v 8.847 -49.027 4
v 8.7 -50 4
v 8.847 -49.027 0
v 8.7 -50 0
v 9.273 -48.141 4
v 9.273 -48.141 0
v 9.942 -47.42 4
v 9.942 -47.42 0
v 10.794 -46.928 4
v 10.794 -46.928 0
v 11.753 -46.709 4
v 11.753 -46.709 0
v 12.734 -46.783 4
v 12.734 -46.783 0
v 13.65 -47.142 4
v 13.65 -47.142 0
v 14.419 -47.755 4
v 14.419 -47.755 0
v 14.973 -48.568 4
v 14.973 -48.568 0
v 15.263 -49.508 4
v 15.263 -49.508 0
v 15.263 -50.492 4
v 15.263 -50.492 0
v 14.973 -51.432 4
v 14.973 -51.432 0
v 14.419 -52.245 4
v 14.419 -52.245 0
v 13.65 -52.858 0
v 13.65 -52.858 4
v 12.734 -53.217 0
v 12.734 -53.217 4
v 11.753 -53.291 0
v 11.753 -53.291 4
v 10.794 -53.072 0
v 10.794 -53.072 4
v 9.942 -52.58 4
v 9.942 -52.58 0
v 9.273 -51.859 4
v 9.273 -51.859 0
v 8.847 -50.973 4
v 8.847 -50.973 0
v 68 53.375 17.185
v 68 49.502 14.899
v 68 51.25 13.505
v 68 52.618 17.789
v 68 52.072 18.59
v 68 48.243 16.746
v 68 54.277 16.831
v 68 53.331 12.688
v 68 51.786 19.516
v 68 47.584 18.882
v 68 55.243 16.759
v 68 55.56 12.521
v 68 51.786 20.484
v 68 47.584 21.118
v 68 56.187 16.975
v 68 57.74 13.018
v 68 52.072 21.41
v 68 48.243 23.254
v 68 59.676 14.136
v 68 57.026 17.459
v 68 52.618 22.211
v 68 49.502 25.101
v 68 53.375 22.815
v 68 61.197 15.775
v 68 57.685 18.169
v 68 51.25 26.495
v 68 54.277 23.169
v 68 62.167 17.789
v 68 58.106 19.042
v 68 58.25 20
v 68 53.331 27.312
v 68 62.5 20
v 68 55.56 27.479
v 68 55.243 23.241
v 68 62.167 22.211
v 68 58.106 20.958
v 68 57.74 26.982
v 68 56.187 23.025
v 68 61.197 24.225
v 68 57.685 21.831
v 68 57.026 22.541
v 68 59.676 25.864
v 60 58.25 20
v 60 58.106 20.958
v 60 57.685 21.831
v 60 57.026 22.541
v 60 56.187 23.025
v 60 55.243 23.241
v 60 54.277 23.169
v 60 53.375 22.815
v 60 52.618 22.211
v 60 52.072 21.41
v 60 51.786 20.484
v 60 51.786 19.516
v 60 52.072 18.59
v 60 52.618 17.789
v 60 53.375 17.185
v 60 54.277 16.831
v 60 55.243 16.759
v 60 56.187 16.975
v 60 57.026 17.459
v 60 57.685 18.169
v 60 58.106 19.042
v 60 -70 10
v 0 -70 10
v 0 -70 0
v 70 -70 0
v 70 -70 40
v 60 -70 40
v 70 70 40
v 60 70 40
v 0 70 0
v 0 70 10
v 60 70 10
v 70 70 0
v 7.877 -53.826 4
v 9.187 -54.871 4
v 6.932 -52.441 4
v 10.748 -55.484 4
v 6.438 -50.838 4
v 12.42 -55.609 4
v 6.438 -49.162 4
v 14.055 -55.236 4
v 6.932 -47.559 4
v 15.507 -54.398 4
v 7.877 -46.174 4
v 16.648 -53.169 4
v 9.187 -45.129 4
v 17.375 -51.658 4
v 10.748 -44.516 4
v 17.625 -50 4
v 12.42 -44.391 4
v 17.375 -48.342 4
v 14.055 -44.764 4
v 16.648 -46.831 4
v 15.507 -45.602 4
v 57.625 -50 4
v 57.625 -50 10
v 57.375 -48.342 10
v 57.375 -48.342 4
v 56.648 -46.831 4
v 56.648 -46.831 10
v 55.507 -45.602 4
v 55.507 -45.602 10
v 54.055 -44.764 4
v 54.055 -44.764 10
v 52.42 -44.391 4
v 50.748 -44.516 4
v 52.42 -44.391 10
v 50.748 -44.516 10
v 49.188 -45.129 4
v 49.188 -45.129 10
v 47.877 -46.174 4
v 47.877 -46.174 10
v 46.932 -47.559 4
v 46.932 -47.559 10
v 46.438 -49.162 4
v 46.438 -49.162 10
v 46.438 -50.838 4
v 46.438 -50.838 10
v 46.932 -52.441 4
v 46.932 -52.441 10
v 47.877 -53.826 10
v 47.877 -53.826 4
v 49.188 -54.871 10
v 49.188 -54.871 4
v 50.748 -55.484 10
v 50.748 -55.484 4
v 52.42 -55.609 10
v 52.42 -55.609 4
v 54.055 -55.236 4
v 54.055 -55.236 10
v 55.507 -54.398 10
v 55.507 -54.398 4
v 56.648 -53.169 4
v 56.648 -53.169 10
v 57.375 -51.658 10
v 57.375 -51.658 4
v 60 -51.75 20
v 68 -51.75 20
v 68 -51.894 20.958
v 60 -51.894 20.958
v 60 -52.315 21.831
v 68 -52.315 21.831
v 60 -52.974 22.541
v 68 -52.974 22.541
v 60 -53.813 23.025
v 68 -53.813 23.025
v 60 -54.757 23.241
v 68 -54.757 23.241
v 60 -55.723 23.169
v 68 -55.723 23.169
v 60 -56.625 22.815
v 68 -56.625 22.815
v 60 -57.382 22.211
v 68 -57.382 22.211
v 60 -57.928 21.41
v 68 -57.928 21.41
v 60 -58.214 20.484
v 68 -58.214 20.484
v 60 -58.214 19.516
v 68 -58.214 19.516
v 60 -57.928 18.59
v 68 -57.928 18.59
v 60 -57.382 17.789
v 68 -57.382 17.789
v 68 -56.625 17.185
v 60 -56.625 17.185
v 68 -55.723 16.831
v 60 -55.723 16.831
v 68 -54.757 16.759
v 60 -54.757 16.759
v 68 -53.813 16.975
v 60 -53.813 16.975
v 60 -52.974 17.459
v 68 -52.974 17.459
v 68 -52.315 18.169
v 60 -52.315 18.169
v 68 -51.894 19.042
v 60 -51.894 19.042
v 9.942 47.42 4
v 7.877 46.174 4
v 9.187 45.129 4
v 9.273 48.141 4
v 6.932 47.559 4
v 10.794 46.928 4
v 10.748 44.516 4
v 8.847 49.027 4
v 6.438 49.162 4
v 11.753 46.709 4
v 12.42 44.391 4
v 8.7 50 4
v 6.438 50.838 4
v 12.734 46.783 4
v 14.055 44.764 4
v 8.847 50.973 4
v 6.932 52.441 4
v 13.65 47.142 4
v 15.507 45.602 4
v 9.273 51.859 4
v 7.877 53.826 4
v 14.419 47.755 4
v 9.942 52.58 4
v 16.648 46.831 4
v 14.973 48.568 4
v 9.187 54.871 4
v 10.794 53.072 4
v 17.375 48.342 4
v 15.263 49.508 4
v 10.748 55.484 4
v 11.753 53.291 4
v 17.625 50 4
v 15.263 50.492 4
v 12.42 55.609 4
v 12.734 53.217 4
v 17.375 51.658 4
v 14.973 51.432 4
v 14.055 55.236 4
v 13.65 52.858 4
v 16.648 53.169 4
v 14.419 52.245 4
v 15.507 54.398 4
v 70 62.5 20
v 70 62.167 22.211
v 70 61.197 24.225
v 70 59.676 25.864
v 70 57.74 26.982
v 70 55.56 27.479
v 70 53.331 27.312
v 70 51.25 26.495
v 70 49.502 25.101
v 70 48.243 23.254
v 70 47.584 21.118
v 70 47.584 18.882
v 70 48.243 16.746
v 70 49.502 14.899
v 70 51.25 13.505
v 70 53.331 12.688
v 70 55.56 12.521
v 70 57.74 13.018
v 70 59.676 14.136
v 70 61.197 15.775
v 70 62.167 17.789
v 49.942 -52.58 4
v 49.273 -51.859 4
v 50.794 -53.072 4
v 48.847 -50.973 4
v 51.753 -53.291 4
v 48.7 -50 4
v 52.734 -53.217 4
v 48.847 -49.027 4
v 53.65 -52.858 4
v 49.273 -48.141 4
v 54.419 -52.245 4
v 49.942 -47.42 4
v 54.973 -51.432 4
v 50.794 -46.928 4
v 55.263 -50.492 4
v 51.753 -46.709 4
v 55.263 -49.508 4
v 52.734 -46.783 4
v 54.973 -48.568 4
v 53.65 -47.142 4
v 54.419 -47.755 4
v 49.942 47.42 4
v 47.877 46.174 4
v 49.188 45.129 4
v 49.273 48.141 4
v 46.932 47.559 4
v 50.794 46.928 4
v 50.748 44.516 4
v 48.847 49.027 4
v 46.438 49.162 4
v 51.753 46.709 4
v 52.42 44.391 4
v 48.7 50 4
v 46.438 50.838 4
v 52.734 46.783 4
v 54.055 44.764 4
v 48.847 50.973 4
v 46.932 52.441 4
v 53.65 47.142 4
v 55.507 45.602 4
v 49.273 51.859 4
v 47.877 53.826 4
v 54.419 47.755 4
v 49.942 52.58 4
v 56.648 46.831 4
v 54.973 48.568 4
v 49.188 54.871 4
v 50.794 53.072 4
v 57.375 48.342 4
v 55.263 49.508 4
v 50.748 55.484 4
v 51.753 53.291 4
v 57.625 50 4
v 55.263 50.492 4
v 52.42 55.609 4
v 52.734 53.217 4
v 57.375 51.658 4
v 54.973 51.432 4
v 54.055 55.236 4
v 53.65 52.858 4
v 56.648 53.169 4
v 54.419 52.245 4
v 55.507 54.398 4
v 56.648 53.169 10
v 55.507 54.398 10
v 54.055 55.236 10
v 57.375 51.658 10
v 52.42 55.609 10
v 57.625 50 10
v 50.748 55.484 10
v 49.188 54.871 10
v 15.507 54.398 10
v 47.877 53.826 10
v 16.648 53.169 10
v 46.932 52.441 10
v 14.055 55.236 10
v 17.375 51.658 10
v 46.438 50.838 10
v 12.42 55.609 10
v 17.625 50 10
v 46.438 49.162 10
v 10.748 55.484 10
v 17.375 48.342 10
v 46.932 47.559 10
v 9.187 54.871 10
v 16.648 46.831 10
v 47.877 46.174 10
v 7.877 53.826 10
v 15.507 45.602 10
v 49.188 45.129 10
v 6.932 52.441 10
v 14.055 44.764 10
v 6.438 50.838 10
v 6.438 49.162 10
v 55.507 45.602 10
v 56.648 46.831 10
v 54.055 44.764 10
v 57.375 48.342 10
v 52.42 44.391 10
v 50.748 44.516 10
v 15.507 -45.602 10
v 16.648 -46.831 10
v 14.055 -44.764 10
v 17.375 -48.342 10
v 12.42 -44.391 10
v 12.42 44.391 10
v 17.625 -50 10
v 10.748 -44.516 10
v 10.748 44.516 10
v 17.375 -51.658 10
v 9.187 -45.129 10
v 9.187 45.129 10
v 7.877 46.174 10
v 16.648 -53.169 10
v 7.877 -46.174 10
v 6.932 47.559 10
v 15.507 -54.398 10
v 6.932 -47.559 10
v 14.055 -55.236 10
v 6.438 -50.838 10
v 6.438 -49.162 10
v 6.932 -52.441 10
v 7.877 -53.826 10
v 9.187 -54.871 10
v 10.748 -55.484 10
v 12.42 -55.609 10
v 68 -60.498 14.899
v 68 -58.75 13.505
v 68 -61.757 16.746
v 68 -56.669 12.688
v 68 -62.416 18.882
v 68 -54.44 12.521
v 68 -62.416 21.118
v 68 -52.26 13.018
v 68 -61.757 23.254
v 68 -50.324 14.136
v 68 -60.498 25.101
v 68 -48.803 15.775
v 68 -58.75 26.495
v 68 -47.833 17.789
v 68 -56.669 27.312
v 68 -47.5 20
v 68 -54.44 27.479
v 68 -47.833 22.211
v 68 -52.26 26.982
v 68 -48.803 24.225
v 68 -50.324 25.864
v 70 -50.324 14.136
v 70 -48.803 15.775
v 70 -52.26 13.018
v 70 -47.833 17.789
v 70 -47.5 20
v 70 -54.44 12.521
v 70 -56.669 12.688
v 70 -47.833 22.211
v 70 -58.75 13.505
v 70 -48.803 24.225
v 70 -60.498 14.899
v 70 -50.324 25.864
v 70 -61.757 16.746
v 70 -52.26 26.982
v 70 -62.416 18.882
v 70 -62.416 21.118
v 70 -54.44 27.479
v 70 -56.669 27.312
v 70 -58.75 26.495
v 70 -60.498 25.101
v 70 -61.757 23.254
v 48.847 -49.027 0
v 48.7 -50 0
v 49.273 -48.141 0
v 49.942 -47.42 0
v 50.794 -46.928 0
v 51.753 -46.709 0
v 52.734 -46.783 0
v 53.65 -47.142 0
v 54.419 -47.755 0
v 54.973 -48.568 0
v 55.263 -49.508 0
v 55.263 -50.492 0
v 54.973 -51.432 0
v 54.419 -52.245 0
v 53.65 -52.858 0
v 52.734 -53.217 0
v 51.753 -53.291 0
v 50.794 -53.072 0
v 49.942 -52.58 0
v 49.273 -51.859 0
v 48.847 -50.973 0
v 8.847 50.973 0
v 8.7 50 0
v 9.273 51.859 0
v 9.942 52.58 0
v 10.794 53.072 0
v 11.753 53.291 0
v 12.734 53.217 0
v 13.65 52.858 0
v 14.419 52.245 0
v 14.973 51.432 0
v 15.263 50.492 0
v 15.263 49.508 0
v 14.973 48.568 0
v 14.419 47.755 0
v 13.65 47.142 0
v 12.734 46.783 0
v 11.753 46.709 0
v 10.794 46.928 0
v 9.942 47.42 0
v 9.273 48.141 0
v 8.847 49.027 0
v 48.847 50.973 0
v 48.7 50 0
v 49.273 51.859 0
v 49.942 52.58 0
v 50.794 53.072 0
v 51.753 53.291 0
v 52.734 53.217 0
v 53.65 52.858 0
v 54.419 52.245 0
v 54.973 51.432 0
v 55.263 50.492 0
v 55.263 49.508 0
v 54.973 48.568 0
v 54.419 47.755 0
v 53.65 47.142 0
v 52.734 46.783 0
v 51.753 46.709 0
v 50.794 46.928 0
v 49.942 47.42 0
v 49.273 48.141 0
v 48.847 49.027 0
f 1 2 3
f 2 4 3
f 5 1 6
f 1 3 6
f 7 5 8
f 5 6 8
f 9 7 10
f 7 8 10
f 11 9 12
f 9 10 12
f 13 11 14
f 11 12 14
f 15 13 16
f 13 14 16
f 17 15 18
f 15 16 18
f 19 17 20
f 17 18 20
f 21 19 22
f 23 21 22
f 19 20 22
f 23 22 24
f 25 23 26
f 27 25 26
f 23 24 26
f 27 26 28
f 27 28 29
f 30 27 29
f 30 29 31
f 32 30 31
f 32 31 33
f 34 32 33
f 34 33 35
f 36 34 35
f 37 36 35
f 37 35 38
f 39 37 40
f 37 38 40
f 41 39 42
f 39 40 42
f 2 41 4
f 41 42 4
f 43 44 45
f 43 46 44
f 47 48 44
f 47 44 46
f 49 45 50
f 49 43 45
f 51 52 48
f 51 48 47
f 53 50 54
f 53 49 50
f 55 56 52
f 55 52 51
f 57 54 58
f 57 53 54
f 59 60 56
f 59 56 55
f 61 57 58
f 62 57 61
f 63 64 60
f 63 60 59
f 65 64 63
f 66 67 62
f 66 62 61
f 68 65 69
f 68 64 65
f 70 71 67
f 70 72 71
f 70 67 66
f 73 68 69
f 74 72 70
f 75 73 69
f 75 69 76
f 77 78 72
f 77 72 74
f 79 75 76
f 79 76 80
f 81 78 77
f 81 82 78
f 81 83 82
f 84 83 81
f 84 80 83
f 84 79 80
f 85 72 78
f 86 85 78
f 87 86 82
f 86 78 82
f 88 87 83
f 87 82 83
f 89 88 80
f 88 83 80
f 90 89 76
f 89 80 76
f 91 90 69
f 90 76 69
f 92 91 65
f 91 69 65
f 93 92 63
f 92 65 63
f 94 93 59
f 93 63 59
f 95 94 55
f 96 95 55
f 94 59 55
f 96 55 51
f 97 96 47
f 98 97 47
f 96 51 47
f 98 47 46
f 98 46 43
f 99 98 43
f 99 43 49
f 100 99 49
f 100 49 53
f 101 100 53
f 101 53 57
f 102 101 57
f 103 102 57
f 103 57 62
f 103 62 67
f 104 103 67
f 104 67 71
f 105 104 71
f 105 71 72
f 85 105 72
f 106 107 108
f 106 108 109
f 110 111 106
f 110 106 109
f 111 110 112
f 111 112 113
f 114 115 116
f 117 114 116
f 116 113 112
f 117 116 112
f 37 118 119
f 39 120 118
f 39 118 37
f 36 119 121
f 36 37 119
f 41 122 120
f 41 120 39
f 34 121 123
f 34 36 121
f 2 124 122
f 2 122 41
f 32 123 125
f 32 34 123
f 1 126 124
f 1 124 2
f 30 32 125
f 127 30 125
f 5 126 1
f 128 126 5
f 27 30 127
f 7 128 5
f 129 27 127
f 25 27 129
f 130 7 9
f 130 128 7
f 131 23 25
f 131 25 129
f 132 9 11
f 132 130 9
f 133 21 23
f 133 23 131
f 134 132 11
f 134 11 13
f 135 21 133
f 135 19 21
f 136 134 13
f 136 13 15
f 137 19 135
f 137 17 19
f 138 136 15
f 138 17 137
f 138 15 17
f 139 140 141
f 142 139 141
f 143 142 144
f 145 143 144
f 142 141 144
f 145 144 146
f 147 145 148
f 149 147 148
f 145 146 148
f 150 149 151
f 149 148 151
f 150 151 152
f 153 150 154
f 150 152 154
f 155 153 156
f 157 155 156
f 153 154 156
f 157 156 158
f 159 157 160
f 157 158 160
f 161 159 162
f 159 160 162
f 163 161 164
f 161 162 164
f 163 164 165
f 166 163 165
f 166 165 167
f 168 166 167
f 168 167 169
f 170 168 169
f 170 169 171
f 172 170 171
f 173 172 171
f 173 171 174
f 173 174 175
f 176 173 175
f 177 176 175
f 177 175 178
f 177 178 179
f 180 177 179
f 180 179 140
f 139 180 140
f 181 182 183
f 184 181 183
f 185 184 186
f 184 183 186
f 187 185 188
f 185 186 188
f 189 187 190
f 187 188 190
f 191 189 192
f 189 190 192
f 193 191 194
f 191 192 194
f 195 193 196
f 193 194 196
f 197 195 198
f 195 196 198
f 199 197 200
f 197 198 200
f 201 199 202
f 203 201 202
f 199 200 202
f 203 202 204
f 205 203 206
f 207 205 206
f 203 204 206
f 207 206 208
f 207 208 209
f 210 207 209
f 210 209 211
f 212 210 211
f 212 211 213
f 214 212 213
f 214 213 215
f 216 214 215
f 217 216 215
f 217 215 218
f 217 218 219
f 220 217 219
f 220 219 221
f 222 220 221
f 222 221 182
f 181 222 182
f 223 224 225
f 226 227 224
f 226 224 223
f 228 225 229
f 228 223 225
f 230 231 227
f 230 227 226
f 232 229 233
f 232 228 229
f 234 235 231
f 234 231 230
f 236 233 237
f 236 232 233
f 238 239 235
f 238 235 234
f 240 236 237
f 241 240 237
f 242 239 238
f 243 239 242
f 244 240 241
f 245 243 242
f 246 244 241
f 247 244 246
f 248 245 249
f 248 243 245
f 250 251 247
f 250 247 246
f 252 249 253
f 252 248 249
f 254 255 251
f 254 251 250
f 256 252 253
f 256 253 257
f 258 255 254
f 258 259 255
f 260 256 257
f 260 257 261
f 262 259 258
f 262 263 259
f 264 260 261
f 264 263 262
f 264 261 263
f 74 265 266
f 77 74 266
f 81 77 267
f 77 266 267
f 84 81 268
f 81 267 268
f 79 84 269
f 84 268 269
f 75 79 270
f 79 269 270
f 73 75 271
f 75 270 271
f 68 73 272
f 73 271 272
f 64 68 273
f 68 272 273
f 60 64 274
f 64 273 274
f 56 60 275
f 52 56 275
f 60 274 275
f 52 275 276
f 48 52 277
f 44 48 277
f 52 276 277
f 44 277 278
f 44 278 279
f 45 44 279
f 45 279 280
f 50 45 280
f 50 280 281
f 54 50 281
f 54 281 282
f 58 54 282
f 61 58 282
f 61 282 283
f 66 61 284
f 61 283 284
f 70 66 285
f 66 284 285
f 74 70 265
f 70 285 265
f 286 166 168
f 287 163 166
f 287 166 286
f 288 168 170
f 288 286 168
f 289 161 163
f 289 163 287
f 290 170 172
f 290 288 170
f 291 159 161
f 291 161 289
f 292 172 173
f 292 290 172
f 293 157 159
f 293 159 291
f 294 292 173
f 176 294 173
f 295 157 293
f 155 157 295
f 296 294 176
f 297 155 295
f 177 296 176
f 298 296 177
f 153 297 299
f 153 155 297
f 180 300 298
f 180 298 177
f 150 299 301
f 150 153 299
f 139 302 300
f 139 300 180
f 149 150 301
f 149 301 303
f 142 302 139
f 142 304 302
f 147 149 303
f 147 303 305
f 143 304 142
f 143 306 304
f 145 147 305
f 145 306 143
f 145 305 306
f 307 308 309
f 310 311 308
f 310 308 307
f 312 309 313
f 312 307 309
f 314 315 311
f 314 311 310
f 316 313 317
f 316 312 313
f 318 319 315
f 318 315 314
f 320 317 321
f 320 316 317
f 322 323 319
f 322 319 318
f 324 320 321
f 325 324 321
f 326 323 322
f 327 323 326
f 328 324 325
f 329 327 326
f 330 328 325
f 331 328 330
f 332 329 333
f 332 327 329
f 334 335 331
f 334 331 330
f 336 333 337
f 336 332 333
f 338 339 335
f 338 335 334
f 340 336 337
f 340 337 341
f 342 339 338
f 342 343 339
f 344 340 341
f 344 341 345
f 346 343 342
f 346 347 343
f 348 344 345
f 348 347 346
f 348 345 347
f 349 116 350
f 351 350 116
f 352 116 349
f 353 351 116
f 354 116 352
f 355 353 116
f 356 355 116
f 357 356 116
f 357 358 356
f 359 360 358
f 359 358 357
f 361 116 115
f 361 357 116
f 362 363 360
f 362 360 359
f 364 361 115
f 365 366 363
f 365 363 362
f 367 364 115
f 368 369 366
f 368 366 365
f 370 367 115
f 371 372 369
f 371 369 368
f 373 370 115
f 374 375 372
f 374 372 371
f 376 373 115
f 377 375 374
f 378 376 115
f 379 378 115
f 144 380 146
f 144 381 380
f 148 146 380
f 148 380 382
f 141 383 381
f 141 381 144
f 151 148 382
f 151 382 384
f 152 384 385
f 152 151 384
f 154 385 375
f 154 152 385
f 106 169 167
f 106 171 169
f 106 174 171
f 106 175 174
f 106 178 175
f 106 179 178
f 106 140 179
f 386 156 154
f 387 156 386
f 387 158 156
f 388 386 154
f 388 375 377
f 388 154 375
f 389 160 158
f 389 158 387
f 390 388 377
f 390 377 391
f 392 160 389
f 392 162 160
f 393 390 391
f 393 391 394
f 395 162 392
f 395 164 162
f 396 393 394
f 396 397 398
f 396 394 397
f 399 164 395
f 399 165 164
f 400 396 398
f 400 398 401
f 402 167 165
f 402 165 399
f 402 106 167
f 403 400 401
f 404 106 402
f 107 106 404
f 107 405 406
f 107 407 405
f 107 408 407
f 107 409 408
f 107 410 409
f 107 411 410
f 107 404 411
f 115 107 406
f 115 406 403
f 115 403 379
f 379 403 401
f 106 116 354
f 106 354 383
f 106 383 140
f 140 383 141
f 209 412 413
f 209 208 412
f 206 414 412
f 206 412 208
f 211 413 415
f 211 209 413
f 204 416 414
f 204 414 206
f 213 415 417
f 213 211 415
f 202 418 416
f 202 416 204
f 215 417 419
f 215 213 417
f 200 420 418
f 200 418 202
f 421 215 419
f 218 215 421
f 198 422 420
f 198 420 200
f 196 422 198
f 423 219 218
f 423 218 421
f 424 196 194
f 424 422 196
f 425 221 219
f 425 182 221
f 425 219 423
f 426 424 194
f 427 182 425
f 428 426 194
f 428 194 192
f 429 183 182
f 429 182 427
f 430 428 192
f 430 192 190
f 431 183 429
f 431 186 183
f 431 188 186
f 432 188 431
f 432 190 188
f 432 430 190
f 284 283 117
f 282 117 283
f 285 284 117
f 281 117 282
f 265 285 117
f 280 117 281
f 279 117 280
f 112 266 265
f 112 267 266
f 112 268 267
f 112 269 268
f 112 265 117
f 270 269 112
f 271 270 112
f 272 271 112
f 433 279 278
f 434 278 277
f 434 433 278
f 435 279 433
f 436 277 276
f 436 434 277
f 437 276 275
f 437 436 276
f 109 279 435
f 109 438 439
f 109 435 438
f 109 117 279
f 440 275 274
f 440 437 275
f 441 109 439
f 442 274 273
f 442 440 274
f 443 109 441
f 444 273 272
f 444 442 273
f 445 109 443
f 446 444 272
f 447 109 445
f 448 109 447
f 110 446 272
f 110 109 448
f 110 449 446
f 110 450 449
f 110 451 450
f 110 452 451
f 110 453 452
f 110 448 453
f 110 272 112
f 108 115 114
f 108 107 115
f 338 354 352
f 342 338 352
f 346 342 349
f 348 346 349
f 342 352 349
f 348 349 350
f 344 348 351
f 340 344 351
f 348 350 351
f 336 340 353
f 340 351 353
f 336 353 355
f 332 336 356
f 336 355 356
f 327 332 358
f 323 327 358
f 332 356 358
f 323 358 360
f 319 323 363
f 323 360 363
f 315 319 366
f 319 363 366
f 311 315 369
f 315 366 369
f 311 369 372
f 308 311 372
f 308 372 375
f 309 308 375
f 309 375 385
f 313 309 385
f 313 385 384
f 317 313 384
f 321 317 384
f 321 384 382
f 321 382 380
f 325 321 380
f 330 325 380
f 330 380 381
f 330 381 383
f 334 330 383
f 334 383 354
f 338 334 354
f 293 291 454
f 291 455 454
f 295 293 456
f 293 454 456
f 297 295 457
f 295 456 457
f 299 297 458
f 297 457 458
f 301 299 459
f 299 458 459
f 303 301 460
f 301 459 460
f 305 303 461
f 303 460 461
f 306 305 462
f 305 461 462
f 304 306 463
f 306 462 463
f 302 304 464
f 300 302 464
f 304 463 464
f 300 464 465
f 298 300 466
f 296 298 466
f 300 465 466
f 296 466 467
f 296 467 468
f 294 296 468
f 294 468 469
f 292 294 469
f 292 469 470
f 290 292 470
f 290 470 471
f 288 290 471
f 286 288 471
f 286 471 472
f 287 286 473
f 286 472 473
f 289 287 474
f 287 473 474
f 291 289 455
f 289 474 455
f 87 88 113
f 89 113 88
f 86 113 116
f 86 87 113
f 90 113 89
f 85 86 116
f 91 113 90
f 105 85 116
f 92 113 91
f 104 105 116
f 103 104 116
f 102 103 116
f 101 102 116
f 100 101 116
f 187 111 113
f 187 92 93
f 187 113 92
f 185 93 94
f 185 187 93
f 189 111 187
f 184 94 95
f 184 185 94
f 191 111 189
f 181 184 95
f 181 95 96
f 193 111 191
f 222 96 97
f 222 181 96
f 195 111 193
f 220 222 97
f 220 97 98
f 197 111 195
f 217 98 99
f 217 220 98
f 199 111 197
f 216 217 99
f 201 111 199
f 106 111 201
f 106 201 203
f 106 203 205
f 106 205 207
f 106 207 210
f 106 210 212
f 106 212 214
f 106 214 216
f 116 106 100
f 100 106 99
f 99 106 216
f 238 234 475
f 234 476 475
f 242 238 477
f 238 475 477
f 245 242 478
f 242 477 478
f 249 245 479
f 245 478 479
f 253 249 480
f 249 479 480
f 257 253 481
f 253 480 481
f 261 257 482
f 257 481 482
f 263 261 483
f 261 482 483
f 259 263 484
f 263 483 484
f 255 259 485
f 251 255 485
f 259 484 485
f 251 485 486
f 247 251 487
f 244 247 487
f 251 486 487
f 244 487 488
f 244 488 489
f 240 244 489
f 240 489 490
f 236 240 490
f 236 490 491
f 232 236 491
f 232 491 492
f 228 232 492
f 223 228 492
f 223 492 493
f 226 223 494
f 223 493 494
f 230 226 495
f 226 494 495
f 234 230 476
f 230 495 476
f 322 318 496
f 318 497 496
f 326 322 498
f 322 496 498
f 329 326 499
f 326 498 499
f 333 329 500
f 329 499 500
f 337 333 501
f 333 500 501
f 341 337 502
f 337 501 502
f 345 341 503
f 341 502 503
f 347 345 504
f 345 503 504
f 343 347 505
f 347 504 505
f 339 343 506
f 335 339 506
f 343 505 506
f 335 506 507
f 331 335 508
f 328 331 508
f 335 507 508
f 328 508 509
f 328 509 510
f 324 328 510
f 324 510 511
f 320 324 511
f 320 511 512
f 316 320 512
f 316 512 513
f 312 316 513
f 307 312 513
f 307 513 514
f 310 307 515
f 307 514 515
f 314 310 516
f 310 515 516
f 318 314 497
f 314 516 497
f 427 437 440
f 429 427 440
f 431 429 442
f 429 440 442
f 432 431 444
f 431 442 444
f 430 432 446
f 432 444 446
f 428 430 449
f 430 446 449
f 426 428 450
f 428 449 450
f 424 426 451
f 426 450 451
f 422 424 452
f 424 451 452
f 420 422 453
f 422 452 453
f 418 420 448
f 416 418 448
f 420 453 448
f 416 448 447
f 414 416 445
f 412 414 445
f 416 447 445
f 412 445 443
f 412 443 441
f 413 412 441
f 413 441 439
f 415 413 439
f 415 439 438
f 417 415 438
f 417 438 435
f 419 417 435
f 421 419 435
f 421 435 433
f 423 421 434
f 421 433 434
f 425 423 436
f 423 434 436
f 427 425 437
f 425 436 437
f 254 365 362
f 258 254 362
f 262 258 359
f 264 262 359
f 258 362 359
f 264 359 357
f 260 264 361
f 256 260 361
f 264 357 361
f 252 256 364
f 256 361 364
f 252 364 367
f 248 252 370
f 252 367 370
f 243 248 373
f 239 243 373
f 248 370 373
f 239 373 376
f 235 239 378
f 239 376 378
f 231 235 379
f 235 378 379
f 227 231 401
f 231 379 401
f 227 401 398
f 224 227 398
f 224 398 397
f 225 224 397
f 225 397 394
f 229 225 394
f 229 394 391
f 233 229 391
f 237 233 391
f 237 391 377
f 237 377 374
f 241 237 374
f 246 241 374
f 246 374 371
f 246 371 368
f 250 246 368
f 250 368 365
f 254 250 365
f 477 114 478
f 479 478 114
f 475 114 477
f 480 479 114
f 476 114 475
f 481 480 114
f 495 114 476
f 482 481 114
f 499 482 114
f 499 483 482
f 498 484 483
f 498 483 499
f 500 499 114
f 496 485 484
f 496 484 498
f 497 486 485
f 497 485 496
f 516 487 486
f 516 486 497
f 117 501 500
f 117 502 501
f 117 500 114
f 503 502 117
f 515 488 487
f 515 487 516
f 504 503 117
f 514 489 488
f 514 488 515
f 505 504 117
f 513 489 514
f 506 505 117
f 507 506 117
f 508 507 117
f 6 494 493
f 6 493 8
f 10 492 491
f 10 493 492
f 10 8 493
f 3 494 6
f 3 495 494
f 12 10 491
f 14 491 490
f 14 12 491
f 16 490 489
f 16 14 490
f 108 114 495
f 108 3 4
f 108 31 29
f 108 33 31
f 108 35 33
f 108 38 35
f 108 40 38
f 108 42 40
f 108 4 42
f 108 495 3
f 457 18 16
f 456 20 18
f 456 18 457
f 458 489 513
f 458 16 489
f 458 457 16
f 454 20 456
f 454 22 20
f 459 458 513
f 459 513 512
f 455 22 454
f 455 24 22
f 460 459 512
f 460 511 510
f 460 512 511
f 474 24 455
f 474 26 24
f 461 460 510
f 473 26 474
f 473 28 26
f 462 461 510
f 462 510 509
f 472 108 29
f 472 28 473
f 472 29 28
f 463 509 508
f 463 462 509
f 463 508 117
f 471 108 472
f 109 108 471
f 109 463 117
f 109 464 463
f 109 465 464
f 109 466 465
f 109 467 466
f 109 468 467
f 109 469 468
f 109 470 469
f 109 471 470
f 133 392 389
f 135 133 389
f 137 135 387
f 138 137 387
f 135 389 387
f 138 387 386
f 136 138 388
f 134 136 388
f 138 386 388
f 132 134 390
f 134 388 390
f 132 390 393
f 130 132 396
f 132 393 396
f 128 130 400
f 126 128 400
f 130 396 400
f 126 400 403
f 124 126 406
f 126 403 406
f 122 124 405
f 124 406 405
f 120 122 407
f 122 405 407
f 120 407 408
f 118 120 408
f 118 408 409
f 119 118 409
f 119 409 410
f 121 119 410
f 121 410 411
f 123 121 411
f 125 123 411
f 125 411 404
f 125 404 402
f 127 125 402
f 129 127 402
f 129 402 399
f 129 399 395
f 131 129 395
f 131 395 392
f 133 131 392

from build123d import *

# Parameters (mm, degrees)
F1_DEPTH       = 70
F3_D           = 6.6
F3_DEPTH       = 12
F3_CBORE_D     = 11.25
F3_CBORE_DEPTH = 6
F3_TIP         = 1.9828400428
F4_R           = 7.5
F5_DEPTH       = 2
F6_R           = 3.25
F7_R           = 3.25
F8_DEPTH       = 25


with BuildPart() as f1:
    # F0 (on Front) → F1 (new body, symmetric)
    with BuildSketch(Plane.XZ):
        Polygon((0, 10), (0, 0), (70, 0), (70, 40), (60, 40), (60, 10), align=None)
    extrude(amount=F1_DEPTH, both=True)

    # F3
    with Locations(Plane.XY.offset(10)):
        with Locations((12, 50), (52, 50), (52, -50), (12, -50)):
            CounterBoreHole(F3_D / 2, F3_CBORE_D / 2, F3_CBORE_DEPTH, depth=F3_DEPTH)
            with Locations((0, 0, -(F3_DEPTH + F3_TIP / 2))):  # 118° drill point
                Cone(0, F3_D / 2, F3_TIP, mode=Mode.SUBTRACT)

    # F4 (on face) → F5 (cut)
    with BuildSketch(Plane.YZ.offset(70)):
        with Locations((-55, 20)):
            Circle(F4_R)
        with Locations((55, 20)):
            Circle(F4_R)
    extrude(amount=-F5_DEPTH, mode=Mode.SUBTRACT)

    # F6 (on face) + F7 (on face) → F8 (cut)
    with BuildSketch(Plane.YZ.offset(68)):
        with Locations((-55, 20)):
            Circle(F6_R)
    with BuildSketch(Plane.YZ.offset(68)):
        with Locations((55, 20)):
            Circle(F7_R)
    extrude(amount=-F8_DEPTH, mode=Mode.SUBTRACT)


solid = f1.part
